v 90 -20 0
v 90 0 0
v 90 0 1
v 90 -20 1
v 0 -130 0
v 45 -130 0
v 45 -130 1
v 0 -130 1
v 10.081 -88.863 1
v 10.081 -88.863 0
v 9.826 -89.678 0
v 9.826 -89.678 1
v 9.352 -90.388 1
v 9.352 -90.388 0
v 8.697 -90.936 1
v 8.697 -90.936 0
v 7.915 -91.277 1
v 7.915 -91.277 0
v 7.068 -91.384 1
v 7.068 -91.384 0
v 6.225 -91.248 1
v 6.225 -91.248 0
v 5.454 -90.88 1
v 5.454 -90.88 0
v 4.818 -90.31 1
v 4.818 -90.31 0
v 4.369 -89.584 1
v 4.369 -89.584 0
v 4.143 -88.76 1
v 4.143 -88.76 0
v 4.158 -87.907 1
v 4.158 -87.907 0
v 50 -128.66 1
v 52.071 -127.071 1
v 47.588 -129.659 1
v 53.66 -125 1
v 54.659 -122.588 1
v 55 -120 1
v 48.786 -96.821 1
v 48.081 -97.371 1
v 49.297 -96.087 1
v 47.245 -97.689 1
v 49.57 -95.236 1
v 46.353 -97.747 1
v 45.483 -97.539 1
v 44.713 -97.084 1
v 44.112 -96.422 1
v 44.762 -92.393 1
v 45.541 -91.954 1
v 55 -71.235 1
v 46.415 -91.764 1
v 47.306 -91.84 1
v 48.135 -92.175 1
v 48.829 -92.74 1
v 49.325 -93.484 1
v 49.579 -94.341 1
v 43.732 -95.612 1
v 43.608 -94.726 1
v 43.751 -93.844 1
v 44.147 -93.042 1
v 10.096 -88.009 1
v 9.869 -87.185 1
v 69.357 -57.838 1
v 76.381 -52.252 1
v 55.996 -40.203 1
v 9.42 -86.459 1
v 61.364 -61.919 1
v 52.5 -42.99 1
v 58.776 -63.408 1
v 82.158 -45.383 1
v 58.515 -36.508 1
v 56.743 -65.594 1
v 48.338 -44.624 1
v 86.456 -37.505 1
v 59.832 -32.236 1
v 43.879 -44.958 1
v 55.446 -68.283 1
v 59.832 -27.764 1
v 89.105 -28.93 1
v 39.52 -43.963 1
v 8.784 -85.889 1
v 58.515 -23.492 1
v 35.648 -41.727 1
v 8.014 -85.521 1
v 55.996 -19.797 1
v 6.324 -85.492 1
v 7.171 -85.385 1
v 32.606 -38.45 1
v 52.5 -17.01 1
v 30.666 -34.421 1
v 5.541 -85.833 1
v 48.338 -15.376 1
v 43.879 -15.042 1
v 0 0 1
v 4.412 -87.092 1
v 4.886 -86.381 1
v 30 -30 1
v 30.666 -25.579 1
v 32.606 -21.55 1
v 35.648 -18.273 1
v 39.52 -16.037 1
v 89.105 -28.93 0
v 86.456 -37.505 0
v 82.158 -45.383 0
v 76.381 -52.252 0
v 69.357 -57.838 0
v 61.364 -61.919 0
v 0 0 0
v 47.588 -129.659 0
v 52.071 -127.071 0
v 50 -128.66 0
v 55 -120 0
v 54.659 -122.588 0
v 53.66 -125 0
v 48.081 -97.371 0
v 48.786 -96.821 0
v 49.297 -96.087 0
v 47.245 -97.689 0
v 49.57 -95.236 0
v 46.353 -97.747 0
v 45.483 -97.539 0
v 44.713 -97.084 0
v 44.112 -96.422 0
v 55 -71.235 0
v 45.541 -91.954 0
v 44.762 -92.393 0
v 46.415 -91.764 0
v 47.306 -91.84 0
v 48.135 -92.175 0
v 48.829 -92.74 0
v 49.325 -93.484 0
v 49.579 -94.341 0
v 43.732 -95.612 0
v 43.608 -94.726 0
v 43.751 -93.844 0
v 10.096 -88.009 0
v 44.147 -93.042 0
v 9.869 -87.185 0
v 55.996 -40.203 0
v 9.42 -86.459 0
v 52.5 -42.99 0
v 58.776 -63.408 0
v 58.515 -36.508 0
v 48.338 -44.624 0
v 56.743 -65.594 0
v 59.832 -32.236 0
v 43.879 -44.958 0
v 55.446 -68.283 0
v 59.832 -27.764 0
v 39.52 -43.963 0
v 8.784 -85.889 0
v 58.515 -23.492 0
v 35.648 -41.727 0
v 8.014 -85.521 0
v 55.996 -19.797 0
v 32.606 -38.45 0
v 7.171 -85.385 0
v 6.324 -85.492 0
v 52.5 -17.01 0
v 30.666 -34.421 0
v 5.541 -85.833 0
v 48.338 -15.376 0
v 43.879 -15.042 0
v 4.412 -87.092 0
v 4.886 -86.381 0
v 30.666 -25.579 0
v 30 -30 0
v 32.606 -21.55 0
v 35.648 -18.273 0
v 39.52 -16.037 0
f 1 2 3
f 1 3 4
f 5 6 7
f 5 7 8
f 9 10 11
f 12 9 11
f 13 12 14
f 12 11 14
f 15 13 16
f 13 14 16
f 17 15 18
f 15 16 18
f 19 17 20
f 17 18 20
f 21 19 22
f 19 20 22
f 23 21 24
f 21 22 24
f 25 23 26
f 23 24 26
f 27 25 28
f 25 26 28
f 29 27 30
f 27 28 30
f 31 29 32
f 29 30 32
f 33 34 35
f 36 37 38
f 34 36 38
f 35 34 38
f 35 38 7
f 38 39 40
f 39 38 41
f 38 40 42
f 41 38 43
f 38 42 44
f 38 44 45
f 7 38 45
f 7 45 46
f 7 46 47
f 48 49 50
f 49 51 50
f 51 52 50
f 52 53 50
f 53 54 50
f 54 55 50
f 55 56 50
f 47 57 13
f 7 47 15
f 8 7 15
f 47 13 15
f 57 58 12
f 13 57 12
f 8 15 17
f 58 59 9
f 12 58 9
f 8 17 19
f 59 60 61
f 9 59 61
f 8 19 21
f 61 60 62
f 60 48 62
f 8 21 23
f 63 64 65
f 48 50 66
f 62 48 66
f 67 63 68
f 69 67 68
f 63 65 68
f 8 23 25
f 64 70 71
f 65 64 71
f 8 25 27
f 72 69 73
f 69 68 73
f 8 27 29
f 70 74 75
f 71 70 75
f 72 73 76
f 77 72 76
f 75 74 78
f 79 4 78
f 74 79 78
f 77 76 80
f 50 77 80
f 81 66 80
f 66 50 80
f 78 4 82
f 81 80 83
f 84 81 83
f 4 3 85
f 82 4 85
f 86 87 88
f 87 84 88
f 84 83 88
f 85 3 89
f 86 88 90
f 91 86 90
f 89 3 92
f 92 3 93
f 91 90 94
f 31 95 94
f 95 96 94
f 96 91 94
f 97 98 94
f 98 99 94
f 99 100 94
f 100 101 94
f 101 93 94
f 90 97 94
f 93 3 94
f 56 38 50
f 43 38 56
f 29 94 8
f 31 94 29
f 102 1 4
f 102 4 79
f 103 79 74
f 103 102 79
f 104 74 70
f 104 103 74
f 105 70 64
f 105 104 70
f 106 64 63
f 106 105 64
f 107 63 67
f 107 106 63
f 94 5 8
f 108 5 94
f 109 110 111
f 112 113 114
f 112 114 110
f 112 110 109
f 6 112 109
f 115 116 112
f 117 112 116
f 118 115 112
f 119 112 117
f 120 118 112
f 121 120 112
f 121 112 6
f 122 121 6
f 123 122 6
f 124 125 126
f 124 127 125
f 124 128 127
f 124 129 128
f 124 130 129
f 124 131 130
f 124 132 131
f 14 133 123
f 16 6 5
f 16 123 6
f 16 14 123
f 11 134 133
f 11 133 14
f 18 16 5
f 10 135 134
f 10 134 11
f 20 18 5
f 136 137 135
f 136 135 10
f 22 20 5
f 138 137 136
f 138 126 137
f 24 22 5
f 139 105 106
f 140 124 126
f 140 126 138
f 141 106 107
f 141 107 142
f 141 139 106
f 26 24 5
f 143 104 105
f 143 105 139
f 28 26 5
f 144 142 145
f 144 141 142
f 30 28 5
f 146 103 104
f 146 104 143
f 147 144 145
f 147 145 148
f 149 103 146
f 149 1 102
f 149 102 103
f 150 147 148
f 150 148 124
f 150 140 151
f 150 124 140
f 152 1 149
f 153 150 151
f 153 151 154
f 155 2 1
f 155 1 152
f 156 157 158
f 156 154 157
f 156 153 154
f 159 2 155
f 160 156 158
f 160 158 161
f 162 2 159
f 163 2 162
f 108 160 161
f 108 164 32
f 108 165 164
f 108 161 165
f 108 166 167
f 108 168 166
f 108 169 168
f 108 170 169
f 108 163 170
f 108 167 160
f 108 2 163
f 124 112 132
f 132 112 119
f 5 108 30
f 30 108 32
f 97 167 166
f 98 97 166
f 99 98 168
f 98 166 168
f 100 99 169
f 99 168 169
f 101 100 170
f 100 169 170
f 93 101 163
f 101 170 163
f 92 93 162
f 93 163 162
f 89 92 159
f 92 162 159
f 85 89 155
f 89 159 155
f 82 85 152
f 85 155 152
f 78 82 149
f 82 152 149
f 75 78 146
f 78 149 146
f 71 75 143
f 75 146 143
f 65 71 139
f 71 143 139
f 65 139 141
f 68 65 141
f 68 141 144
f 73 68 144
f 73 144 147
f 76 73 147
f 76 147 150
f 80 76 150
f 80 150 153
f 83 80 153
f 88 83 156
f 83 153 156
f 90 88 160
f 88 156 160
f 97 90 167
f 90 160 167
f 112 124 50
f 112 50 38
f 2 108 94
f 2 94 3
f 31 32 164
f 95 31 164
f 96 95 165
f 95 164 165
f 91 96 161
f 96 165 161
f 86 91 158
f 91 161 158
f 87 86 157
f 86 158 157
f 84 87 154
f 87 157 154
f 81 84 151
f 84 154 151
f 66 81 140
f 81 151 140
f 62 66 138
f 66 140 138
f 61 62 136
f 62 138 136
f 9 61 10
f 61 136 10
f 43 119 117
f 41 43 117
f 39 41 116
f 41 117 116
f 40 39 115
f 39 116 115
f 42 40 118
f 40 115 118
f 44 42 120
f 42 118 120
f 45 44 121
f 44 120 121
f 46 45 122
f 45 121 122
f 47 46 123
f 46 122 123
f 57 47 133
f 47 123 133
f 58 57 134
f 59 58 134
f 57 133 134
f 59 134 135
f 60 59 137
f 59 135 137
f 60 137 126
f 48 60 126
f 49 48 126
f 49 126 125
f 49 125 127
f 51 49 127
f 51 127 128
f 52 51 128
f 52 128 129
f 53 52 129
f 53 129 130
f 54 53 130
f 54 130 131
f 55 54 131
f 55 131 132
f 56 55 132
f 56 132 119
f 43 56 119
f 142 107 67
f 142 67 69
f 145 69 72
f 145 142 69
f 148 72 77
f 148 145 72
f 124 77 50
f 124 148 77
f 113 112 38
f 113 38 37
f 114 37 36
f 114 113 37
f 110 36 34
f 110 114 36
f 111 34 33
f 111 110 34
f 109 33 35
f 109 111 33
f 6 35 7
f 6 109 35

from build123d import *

# Parameters (mm, degrees)
SKETCH1_R           = 15
BOSS_EXTRUDE1_DEPTH = 1
CUT_EXTRUDE1_DEPTH  = 10


with BuildPart() as part:
    # Sketch1 → Boss-Extrude1 (new body)
    with BuildSketch(Plane(origin=(0, 0, 0), x_dir=(-1, 0, 0), z_dir=(0, 0, -1))):
        with BuildLine():
            Line((0, -75), (0, 0))
            Line((0, 0), (-90, 0))
            Line((-90, 0), (-90, -20))
            ThreePointArc((-90, -20), (-82.157527073, -45.383423367), (-61.363636364, -61.919344043))
            ThreePointArc((-61.363636364, -61.919344043), (-56.742771762, -65.593993082), (-55, -71.23475383))
            Line((-55, -71.23475383), (-55, -120))
            ThreePointArc((-55, -120), (-52.071067812, -127.071067812), (-45, -130))
            Line((-45, -130), (0, -130))
            Line((0, -130), (0, -75))
        make_face()
        with Locations((-45, -30)):
            Circle(SKETCH1_R, mode=Mode.SUBTRACT)
    extrude(amount=-BOSS_EXTRUDE1_DEPTH)

    # Sketch2 → Cut-Extrude1 (cut)
    with BuildSketch(Plane(origin=(0, 0, 0), x_dir=(-1, 0, 0), z_dir=(0, 0, -1))):
        with BuildLine():
            ThreePointArc((-43.646562299, -94.279689067), (-47.086223708, -91.795996374), (-49.569916401, -95.235657783))
            ThreePointArc((-49.569916401, -95.235657783), (-46.130254992, -97.719350476), (-43.646562299, -94.279689067))
        make_face()
        with BuildLine():
            ThreePointArc((-10.080889056, -88.862533012), (-6.641227647, -91.346225705), (-4.157534954, -87.906564297))
            ThreePointArc((-4.157534954, -87.906564297), (-7.597196363, -85.422871604), (-10.080889056, -88.862533012))
        make_face()
    extrude(amount=-CUT_EXTRUDE1_DEPTH, mode=Mode.SUBTRACT)


solid = part.part
